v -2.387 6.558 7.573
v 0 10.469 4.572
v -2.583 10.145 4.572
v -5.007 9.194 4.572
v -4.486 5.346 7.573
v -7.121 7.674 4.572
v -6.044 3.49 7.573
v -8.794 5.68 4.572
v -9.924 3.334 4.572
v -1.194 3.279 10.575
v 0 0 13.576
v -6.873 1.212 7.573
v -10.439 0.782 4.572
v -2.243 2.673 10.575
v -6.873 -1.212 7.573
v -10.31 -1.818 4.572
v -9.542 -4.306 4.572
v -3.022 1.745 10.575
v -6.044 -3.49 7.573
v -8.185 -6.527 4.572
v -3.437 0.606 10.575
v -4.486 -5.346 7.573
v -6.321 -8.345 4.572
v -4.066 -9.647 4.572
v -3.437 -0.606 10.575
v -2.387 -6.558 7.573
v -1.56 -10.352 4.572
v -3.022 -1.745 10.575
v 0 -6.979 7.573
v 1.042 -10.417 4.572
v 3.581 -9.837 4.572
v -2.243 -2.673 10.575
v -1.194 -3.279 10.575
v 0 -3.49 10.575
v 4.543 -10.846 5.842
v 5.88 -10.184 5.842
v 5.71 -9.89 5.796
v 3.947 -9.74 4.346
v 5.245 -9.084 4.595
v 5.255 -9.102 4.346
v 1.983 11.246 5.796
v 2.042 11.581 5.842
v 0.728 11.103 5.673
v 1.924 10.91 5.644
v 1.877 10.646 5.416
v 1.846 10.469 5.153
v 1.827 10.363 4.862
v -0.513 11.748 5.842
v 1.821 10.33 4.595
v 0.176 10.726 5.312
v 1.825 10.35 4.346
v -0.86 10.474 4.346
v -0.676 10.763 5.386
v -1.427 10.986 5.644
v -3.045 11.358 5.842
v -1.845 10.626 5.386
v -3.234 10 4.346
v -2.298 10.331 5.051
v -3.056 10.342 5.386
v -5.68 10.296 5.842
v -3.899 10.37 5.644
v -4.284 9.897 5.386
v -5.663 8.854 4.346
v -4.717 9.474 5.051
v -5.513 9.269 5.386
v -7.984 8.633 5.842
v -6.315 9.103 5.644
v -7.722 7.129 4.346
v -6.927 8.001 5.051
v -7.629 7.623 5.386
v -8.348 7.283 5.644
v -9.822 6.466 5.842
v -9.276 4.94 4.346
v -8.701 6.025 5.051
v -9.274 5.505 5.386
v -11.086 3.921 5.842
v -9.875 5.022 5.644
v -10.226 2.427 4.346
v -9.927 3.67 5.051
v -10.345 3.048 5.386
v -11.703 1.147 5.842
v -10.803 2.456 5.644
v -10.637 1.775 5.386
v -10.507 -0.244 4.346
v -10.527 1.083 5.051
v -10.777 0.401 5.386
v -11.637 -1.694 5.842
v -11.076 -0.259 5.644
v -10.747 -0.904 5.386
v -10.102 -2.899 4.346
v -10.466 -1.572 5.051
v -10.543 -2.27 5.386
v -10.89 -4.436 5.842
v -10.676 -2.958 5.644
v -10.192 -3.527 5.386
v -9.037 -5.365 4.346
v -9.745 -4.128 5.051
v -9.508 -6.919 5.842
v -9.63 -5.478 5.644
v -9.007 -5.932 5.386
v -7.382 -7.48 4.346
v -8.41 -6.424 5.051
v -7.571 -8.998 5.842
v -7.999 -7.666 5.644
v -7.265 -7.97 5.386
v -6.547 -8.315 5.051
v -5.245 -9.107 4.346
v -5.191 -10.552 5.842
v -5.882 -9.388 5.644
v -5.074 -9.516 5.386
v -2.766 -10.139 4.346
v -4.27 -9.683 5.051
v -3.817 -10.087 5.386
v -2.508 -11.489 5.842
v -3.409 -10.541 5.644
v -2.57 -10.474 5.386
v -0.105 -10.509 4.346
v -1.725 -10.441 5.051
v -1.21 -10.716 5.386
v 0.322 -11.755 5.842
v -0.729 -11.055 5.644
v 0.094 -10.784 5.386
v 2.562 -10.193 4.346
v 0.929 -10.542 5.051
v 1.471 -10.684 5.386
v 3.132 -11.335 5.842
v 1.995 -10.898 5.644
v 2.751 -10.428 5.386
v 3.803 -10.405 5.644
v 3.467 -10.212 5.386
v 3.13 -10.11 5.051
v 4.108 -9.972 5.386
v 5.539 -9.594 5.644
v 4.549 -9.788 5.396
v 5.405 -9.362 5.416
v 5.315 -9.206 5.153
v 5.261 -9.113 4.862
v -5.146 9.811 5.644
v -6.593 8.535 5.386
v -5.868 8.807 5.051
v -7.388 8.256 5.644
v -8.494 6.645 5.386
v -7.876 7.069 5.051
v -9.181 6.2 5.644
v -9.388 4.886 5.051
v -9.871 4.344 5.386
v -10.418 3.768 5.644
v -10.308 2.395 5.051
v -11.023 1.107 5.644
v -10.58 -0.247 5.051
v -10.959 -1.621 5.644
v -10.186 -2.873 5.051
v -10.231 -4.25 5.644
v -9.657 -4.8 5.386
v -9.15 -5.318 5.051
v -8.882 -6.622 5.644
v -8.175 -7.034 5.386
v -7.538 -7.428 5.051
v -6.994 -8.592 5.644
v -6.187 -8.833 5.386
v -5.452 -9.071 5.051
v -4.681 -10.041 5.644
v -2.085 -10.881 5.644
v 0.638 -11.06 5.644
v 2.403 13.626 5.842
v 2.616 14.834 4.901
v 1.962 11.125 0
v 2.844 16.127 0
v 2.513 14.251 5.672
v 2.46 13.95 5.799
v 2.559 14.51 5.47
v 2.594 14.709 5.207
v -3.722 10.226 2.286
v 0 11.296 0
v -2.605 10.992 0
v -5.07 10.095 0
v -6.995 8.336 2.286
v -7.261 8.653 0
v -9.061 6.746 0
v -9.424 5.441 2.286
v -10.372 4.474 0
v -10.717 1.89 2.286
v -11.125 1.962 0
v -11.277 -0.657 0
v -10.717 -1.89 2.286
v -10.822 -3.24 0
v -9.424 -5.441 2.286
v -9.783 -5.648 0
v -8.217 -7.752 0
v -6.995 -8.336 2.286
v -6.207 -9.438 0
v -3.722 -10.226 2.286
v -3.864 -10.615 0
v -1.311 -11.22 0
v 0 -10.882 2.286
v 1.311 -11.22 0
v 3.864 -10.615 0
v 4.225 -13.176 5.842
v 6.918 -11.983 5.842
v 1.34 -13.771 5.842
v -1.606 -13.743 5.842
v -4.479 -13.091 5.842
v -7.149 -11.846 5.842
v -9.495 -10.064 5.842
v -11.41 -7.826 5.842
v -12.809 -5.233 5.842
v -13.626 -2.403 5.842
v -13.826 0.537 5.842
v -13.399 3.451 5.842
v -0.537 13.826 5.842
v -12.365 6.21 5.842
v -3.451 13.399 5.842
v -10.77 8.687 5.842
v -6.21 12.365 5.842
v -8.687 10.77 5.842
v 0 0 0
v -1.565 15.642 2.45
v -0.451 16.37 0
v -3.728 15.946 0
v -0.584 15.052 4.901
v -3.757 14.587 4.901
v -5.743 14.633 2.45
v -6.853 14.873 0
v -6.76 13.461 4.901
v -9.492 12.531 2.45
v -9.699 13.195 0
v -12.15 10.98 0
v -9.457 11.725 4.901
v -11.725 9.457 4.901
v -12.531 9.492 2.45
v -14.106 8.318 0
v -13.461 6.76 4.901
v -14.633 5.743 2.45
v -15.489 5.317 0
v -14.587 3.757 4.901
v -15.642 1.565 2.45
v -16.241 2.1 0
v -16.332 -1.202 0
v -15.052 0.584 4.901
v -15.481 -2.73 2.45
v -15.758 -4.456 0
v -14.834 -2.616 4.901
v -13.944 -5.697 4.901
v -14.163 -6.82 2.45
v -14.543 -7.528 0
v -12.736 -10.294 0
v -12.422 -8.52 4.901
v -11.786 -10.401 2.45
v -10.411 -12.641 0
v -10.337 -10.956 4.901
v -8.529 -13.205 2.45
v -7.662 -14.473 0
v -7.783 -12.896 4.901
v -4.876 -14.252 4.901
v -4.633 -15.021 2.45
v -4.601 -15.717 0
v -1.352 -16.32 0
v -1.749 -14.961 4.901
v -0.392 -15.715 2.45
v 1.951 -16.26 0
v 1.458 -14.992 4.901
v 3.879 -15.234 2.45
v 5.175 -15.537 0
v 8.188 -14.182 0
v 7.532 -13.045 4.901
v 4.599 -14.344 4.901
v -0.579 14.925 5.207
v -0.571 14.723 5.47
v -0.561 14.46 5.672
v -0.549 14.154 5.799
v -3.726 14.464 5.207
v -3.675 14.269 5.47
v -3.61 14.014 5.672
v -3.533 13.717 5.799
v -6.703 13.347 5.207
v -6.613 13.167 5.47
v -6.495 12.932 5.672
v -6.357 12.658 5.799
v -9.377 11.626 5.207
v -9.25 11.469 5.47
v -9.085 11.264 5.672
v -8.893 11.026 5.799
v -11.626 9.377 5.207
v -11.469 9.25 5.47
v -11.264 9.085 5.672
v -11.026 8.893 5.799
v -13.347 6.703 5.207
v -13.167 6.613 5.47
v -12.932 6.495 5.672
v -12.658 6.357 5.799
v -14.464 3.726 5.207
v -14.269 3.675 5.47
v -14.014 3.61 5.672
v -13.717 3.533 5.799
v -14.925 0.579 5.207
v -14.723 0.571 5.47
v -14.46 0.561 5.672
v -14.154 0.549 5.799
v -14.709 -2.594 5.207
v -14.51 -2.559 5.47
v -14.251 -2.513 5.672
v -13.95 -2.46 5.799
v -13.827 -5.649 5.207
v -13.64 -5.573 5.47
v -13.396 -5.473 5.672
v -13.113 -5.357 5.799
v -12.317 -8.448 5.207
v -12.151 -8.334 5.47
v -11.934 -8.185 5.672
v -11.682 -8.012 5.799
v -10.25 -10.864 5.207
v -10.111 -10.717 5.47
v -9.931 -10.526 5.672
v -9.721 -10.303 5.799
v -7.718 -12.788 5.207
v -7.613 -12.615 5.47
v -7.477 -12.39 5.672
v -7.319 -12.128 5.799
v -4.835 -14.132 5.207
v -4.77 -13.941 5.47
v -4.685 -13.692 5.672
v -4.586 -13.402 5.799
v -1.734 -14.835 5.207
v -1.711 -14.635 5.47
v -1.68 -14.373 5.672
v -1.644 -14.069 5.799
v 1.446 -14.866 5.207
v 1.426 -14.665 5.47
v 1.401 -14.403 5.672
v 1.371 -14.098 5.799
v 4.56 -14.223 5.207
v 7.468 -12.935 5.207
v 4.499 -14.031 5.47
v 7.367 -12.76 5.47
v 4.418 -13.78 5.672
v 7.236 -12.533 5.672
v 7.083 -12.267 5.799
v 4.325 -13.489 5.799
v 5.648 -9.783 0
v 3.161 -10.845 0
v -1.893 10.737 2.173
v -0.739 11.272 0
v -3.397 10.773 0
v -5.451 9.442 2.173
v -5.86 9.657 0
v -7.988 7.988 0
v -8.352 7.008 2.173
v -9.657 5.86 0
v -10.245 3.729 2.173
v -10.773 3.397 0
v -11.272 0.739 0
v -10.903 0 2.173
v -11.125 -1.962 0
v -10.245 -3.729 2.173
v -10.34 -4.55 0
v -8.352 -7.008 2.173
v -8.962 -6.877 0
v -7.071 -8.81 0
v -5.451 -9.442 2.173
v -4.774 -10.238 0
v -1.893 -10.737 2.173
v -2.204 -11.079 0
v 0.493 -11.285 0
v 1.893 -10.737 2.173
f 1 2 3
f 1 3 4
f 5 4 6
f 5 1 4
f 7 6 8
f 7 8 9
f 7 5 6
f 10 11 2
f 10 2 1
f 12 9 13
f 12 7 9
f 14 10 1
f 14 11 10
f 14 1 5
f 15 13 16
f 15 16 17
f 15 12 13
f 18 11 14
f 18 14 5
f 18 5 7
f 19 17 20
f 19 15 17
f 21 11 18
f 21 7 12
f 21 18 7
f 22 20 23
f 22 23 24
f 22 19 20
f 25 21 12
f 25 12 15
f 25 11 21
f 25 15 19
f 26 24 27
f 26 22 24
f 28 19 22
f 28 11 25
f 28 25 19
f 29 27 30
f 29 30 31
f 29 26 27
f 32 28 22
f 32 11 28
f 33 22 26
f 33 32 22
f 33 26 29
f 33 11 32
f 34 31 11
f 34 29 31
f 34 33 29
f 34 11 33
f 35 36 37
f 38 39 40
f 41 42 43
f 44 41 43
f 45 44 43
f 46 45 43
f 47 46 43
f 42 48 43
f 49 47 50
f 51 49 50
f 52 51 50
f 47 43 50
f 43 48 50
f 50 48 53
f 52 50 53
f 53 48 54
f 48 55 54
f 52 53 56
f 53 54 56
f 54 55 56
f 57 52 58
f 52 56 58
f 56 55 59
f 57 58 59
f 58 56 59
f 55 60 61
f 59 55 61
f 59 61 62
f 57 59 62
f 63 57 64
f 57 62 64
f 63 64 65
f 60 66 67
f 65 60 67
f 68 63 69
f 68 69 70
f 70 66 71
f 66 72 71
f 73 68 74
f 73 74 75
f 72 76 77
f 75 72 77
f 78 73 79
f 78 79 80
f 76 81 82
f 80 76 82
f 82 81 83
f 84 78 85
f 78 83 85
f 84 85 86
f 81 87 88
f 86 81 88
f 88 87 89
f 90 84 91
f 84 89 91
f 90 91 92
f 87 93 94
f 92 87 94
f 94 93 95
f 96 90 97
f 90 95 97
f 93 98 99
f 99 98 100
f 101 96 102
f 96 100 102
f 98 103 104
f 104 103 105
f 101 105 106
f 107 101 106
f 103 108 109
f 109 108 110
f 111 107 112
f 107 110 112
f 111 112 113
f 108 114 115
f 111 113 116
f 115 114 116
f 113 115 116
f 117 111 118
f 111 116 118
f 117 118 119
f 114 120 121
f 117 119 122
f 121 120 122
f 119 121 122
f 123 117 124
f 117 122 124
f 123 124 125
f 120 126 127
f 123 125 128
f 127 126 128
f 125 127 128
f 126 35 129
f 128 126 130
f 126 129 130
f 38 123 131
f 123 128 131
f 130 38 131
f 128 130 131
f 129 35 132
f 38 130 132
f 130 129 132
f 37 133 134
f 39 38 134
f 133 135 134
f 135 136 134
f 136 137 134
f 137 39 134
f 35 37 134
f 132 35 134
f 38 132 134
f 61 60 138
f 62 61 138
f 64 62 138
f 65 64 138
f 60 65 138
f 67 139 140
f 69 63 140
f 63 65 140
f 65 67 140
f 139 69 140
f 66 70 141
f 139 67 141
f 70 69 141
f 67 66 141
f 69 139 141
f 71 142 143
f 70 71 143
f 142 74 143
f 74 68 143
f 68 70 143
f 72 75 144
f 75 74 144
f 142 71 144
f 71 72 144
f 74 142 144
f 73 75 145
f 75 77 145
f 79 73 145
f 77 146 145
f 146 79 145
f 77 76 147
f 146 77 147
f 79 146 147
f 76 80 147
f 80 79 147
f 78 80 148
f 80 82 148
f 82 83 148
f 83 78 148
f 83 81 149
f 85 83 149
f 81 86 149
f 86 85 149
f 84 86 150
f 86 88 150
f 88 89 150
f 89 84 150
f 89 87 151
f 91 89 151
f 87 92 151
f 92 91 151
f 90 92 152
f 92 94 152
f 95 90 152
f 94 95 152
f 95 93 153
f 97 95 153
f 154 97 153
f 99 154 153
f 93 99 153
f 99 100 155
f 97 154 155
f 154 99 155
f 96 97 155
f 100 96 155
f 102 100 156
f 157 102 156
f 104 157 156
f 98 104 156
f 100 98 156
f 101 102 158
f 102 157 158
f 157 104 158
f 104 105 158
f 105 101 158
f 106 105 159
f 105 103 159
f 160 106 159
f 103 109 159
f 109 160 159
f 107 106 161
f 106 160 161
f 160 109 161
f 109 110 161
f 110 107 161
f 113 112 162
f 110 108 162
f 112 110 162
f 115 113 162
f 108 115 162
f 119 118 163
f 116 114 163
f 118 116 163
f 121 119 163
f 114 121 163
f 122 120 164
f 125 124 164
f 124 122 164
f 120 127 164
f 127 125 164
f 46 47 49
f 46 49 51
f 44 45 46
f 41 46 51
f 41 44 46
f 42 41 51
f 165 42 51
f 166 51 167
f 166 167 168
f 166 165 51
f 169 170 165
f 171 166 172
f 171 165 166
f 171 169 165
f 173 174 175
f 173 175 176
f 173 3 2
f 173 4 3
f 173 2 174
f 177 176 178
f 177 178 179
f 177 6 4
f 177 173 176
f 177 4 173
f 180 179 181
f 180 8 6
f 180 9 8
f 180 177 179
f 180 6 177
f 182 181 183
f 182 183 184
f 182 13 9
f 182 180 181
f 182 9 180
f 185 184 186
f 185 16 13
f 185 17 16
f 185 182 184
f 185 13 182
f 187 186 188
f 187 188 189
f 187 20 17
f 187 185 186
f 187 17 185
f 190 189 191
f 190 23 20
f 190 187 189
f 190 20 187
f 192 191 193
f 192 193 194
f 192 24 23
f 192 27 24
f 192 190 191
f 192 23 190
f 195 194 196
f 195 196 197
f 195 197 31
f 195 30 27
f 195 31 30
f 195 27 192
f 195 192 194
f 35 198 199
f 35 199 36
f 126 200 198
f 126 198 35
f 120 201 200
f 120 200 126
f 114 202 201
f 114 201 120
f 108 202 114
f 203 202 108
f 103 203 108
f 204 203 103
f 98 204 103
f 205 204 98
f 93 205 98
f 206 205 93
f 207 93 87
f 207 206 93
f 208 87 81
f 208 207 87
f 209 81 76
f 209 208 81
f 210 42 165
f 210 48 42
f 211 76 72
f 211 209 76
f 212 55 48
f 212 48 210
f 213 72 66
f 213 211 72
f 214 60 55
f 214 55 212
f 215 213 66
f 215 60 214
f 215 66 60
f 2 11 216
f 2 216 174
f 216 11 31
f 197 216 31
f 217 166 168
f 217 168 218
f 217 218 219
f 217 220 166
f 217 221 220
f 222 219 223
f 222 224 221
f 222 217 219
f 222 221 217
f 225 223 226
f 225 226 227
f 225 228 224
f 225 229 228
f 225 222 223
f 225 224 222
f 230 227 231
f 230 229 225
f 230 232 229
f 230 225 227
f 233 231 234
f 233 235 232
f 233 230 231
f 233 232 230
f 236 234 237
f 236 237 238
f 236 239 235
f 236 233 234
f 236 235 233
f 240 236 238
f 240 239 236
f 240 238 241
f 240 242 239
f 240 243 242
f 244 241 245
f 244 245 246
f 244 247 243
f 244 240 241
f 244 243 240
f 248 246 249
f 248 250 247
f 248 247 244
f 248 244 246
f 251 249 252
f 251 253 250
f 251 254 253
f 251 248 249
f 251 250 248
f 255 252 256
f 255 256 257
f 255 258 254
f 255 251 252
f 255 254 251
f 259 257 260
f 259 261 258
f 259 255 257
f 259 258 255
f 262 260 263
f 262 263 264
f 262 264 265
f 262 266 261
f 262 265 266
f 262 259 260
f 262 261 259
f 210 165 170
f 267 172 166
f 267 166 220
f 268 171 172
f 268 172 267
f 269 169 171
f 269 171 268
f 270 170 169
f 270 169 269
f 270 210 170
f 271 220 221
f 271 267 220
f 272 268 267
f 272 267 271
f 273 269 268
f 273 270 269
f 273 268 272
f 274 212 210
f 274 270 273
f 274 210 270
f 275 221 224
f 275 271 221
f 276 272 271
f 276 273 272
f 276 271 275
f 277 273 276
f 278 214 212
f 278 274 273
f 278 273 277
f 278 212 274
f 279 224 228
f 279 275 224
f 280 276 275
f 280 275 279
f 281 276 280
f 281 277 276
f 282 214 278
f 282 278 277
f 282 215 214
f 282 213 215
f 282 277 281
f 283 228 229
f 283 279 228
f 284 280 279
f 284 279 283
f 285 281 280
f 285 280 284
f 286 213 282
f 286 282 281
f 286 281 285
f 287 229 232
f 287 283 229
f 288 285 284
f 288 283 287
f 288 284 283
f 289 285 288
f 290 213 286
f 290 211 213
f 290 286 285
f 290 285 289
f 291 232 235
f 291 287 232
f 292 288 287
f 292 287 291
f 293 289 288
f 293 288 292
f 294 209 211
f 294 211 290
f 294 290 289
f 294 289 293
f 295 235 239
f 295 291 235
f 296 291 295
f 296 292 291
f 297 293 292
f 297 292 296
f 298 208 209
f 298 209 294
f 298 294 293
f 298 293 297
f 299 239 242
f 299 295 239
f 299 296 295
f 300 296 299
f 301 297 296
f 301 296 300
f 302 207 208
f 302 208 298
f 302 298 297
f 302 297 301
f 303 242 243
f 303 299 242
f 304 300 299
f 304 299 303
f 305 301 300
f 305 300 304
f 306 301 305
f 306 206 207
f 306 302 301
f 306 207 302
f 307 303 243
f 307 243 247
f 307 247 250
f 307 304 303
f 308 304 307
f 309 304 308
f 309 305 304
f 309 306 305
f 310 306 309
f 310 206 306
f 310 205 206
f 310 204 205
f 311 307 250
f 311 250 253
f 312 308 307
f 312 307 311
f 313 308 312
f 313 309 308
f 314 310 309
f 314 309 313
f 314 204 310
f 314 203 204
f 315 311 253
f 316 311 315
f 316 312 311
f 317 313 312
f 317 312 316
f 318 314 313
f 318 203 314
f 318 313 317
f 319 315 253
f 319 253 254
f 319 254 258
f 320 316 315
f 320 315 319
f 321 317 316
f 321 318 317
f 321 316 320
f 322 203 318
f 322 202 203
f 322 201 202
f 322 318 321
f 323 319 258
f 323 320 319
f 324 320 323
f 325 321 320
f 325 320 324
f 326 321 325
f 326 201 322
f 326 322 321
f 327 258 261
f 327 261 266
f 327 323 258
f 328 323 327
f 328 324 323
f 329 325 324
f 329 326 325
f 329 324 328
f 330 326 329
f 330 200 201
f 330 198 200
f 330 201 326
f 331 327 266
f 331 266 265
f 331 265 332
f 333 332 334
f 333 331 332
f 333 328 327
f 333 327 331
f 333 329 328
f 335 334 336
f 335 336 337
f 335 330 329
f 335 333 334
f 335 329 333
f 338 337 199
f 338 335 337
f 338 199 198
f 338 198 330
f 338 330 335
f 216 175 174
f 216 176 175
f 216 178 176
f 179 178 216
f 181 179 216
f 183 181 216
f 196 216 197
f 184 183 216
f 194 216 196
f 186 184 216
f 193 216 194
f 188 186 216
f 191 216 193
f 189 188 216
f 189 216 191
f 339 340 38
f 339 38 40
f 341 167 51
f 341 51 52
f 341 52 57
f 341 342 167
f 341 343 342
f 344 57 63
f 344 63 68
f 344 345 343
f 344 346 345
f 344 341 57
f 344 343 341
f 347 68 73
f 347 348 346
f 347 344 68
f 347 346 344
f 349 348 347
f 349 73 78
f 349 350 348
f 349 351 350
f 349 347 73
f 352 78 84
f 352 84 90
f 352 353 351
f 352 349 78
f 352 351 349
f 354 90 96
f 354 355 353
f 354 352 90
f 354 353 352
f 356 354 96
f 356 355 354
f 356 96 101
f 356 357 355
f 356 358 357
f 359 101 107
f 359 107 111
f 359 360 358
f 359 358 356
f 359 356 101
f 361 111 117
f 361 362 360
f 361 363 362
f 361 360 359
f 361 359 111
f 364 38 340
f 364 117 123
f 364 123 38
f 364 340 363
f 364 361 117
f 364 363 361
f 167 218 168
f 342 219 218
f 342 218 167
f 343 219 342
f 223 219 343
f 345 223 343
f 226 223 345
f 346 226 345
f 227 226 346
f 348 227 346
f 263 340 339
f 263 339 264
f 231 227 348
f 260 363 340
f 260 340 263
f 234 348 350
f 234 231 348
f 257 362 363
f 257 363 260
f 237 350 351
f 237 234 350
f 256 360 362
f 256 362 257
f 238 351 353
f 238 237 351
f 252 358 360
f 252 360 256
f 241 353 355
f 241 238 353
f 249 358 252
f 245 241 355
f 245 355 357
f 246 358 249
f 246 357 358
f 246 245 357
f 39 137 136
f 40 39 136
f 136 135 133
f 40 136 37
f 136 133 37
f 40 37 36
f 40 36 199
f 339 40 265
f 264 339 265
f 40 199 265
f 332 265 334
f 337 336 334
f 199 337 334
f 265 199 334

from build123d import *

# Parameters (mm, degrees)
F1_ANGLE      = 200
F2_ANGLE_BACK = 10
F2_ANGLE      = 220
F3_R          = 1.27


with BuildPart() as f1:
    # F0 (on Right) → F1 (revolve)
    with BuildSketch(Plane.YZ):
        Polygon((0, 13.5764918386), (0, 0), (11.2961860424, 0), (10.468687552, 4.572), align=None)
    revolve(axis=Axis((0, 0, 6.7882459193), (0, 0, 1)), revolution_arc=F1_ANGLE)


with BuildPart() as f2:
    # F0 (on Right) → F2 (revolve)
    with BuildSketch(Plane.YZ, mode=Mode.PRIVATE) as f2_sk:
        Polygon((10.468687552, 4.572), (11.2961860424, 0), (16.3761860424, 0), (14.8108268602, 5.842), (10.2388268602, 5.842), align=None)
    revolve(f2_sk.sketch.rotate(Axis((0, 0, 6.7882459193), (0, 0, 1)), -F2_ANGLE_BACK), axis=Axis((0, 0, 6.7882459193), (0, 0, 1)), revolution_arc=F2_ANGLE)

    # F3
    f3_edges = [f2.edges().sort_by_distance(p)[0] for p in [
        (-10.083276, -1.777954, 5.842),
        (-14.585817, -2.571873, 5.842),
    ]]
    fillet(f3_edges, radius=F3_R)


solid = Compound([f1.part, f2.part])
